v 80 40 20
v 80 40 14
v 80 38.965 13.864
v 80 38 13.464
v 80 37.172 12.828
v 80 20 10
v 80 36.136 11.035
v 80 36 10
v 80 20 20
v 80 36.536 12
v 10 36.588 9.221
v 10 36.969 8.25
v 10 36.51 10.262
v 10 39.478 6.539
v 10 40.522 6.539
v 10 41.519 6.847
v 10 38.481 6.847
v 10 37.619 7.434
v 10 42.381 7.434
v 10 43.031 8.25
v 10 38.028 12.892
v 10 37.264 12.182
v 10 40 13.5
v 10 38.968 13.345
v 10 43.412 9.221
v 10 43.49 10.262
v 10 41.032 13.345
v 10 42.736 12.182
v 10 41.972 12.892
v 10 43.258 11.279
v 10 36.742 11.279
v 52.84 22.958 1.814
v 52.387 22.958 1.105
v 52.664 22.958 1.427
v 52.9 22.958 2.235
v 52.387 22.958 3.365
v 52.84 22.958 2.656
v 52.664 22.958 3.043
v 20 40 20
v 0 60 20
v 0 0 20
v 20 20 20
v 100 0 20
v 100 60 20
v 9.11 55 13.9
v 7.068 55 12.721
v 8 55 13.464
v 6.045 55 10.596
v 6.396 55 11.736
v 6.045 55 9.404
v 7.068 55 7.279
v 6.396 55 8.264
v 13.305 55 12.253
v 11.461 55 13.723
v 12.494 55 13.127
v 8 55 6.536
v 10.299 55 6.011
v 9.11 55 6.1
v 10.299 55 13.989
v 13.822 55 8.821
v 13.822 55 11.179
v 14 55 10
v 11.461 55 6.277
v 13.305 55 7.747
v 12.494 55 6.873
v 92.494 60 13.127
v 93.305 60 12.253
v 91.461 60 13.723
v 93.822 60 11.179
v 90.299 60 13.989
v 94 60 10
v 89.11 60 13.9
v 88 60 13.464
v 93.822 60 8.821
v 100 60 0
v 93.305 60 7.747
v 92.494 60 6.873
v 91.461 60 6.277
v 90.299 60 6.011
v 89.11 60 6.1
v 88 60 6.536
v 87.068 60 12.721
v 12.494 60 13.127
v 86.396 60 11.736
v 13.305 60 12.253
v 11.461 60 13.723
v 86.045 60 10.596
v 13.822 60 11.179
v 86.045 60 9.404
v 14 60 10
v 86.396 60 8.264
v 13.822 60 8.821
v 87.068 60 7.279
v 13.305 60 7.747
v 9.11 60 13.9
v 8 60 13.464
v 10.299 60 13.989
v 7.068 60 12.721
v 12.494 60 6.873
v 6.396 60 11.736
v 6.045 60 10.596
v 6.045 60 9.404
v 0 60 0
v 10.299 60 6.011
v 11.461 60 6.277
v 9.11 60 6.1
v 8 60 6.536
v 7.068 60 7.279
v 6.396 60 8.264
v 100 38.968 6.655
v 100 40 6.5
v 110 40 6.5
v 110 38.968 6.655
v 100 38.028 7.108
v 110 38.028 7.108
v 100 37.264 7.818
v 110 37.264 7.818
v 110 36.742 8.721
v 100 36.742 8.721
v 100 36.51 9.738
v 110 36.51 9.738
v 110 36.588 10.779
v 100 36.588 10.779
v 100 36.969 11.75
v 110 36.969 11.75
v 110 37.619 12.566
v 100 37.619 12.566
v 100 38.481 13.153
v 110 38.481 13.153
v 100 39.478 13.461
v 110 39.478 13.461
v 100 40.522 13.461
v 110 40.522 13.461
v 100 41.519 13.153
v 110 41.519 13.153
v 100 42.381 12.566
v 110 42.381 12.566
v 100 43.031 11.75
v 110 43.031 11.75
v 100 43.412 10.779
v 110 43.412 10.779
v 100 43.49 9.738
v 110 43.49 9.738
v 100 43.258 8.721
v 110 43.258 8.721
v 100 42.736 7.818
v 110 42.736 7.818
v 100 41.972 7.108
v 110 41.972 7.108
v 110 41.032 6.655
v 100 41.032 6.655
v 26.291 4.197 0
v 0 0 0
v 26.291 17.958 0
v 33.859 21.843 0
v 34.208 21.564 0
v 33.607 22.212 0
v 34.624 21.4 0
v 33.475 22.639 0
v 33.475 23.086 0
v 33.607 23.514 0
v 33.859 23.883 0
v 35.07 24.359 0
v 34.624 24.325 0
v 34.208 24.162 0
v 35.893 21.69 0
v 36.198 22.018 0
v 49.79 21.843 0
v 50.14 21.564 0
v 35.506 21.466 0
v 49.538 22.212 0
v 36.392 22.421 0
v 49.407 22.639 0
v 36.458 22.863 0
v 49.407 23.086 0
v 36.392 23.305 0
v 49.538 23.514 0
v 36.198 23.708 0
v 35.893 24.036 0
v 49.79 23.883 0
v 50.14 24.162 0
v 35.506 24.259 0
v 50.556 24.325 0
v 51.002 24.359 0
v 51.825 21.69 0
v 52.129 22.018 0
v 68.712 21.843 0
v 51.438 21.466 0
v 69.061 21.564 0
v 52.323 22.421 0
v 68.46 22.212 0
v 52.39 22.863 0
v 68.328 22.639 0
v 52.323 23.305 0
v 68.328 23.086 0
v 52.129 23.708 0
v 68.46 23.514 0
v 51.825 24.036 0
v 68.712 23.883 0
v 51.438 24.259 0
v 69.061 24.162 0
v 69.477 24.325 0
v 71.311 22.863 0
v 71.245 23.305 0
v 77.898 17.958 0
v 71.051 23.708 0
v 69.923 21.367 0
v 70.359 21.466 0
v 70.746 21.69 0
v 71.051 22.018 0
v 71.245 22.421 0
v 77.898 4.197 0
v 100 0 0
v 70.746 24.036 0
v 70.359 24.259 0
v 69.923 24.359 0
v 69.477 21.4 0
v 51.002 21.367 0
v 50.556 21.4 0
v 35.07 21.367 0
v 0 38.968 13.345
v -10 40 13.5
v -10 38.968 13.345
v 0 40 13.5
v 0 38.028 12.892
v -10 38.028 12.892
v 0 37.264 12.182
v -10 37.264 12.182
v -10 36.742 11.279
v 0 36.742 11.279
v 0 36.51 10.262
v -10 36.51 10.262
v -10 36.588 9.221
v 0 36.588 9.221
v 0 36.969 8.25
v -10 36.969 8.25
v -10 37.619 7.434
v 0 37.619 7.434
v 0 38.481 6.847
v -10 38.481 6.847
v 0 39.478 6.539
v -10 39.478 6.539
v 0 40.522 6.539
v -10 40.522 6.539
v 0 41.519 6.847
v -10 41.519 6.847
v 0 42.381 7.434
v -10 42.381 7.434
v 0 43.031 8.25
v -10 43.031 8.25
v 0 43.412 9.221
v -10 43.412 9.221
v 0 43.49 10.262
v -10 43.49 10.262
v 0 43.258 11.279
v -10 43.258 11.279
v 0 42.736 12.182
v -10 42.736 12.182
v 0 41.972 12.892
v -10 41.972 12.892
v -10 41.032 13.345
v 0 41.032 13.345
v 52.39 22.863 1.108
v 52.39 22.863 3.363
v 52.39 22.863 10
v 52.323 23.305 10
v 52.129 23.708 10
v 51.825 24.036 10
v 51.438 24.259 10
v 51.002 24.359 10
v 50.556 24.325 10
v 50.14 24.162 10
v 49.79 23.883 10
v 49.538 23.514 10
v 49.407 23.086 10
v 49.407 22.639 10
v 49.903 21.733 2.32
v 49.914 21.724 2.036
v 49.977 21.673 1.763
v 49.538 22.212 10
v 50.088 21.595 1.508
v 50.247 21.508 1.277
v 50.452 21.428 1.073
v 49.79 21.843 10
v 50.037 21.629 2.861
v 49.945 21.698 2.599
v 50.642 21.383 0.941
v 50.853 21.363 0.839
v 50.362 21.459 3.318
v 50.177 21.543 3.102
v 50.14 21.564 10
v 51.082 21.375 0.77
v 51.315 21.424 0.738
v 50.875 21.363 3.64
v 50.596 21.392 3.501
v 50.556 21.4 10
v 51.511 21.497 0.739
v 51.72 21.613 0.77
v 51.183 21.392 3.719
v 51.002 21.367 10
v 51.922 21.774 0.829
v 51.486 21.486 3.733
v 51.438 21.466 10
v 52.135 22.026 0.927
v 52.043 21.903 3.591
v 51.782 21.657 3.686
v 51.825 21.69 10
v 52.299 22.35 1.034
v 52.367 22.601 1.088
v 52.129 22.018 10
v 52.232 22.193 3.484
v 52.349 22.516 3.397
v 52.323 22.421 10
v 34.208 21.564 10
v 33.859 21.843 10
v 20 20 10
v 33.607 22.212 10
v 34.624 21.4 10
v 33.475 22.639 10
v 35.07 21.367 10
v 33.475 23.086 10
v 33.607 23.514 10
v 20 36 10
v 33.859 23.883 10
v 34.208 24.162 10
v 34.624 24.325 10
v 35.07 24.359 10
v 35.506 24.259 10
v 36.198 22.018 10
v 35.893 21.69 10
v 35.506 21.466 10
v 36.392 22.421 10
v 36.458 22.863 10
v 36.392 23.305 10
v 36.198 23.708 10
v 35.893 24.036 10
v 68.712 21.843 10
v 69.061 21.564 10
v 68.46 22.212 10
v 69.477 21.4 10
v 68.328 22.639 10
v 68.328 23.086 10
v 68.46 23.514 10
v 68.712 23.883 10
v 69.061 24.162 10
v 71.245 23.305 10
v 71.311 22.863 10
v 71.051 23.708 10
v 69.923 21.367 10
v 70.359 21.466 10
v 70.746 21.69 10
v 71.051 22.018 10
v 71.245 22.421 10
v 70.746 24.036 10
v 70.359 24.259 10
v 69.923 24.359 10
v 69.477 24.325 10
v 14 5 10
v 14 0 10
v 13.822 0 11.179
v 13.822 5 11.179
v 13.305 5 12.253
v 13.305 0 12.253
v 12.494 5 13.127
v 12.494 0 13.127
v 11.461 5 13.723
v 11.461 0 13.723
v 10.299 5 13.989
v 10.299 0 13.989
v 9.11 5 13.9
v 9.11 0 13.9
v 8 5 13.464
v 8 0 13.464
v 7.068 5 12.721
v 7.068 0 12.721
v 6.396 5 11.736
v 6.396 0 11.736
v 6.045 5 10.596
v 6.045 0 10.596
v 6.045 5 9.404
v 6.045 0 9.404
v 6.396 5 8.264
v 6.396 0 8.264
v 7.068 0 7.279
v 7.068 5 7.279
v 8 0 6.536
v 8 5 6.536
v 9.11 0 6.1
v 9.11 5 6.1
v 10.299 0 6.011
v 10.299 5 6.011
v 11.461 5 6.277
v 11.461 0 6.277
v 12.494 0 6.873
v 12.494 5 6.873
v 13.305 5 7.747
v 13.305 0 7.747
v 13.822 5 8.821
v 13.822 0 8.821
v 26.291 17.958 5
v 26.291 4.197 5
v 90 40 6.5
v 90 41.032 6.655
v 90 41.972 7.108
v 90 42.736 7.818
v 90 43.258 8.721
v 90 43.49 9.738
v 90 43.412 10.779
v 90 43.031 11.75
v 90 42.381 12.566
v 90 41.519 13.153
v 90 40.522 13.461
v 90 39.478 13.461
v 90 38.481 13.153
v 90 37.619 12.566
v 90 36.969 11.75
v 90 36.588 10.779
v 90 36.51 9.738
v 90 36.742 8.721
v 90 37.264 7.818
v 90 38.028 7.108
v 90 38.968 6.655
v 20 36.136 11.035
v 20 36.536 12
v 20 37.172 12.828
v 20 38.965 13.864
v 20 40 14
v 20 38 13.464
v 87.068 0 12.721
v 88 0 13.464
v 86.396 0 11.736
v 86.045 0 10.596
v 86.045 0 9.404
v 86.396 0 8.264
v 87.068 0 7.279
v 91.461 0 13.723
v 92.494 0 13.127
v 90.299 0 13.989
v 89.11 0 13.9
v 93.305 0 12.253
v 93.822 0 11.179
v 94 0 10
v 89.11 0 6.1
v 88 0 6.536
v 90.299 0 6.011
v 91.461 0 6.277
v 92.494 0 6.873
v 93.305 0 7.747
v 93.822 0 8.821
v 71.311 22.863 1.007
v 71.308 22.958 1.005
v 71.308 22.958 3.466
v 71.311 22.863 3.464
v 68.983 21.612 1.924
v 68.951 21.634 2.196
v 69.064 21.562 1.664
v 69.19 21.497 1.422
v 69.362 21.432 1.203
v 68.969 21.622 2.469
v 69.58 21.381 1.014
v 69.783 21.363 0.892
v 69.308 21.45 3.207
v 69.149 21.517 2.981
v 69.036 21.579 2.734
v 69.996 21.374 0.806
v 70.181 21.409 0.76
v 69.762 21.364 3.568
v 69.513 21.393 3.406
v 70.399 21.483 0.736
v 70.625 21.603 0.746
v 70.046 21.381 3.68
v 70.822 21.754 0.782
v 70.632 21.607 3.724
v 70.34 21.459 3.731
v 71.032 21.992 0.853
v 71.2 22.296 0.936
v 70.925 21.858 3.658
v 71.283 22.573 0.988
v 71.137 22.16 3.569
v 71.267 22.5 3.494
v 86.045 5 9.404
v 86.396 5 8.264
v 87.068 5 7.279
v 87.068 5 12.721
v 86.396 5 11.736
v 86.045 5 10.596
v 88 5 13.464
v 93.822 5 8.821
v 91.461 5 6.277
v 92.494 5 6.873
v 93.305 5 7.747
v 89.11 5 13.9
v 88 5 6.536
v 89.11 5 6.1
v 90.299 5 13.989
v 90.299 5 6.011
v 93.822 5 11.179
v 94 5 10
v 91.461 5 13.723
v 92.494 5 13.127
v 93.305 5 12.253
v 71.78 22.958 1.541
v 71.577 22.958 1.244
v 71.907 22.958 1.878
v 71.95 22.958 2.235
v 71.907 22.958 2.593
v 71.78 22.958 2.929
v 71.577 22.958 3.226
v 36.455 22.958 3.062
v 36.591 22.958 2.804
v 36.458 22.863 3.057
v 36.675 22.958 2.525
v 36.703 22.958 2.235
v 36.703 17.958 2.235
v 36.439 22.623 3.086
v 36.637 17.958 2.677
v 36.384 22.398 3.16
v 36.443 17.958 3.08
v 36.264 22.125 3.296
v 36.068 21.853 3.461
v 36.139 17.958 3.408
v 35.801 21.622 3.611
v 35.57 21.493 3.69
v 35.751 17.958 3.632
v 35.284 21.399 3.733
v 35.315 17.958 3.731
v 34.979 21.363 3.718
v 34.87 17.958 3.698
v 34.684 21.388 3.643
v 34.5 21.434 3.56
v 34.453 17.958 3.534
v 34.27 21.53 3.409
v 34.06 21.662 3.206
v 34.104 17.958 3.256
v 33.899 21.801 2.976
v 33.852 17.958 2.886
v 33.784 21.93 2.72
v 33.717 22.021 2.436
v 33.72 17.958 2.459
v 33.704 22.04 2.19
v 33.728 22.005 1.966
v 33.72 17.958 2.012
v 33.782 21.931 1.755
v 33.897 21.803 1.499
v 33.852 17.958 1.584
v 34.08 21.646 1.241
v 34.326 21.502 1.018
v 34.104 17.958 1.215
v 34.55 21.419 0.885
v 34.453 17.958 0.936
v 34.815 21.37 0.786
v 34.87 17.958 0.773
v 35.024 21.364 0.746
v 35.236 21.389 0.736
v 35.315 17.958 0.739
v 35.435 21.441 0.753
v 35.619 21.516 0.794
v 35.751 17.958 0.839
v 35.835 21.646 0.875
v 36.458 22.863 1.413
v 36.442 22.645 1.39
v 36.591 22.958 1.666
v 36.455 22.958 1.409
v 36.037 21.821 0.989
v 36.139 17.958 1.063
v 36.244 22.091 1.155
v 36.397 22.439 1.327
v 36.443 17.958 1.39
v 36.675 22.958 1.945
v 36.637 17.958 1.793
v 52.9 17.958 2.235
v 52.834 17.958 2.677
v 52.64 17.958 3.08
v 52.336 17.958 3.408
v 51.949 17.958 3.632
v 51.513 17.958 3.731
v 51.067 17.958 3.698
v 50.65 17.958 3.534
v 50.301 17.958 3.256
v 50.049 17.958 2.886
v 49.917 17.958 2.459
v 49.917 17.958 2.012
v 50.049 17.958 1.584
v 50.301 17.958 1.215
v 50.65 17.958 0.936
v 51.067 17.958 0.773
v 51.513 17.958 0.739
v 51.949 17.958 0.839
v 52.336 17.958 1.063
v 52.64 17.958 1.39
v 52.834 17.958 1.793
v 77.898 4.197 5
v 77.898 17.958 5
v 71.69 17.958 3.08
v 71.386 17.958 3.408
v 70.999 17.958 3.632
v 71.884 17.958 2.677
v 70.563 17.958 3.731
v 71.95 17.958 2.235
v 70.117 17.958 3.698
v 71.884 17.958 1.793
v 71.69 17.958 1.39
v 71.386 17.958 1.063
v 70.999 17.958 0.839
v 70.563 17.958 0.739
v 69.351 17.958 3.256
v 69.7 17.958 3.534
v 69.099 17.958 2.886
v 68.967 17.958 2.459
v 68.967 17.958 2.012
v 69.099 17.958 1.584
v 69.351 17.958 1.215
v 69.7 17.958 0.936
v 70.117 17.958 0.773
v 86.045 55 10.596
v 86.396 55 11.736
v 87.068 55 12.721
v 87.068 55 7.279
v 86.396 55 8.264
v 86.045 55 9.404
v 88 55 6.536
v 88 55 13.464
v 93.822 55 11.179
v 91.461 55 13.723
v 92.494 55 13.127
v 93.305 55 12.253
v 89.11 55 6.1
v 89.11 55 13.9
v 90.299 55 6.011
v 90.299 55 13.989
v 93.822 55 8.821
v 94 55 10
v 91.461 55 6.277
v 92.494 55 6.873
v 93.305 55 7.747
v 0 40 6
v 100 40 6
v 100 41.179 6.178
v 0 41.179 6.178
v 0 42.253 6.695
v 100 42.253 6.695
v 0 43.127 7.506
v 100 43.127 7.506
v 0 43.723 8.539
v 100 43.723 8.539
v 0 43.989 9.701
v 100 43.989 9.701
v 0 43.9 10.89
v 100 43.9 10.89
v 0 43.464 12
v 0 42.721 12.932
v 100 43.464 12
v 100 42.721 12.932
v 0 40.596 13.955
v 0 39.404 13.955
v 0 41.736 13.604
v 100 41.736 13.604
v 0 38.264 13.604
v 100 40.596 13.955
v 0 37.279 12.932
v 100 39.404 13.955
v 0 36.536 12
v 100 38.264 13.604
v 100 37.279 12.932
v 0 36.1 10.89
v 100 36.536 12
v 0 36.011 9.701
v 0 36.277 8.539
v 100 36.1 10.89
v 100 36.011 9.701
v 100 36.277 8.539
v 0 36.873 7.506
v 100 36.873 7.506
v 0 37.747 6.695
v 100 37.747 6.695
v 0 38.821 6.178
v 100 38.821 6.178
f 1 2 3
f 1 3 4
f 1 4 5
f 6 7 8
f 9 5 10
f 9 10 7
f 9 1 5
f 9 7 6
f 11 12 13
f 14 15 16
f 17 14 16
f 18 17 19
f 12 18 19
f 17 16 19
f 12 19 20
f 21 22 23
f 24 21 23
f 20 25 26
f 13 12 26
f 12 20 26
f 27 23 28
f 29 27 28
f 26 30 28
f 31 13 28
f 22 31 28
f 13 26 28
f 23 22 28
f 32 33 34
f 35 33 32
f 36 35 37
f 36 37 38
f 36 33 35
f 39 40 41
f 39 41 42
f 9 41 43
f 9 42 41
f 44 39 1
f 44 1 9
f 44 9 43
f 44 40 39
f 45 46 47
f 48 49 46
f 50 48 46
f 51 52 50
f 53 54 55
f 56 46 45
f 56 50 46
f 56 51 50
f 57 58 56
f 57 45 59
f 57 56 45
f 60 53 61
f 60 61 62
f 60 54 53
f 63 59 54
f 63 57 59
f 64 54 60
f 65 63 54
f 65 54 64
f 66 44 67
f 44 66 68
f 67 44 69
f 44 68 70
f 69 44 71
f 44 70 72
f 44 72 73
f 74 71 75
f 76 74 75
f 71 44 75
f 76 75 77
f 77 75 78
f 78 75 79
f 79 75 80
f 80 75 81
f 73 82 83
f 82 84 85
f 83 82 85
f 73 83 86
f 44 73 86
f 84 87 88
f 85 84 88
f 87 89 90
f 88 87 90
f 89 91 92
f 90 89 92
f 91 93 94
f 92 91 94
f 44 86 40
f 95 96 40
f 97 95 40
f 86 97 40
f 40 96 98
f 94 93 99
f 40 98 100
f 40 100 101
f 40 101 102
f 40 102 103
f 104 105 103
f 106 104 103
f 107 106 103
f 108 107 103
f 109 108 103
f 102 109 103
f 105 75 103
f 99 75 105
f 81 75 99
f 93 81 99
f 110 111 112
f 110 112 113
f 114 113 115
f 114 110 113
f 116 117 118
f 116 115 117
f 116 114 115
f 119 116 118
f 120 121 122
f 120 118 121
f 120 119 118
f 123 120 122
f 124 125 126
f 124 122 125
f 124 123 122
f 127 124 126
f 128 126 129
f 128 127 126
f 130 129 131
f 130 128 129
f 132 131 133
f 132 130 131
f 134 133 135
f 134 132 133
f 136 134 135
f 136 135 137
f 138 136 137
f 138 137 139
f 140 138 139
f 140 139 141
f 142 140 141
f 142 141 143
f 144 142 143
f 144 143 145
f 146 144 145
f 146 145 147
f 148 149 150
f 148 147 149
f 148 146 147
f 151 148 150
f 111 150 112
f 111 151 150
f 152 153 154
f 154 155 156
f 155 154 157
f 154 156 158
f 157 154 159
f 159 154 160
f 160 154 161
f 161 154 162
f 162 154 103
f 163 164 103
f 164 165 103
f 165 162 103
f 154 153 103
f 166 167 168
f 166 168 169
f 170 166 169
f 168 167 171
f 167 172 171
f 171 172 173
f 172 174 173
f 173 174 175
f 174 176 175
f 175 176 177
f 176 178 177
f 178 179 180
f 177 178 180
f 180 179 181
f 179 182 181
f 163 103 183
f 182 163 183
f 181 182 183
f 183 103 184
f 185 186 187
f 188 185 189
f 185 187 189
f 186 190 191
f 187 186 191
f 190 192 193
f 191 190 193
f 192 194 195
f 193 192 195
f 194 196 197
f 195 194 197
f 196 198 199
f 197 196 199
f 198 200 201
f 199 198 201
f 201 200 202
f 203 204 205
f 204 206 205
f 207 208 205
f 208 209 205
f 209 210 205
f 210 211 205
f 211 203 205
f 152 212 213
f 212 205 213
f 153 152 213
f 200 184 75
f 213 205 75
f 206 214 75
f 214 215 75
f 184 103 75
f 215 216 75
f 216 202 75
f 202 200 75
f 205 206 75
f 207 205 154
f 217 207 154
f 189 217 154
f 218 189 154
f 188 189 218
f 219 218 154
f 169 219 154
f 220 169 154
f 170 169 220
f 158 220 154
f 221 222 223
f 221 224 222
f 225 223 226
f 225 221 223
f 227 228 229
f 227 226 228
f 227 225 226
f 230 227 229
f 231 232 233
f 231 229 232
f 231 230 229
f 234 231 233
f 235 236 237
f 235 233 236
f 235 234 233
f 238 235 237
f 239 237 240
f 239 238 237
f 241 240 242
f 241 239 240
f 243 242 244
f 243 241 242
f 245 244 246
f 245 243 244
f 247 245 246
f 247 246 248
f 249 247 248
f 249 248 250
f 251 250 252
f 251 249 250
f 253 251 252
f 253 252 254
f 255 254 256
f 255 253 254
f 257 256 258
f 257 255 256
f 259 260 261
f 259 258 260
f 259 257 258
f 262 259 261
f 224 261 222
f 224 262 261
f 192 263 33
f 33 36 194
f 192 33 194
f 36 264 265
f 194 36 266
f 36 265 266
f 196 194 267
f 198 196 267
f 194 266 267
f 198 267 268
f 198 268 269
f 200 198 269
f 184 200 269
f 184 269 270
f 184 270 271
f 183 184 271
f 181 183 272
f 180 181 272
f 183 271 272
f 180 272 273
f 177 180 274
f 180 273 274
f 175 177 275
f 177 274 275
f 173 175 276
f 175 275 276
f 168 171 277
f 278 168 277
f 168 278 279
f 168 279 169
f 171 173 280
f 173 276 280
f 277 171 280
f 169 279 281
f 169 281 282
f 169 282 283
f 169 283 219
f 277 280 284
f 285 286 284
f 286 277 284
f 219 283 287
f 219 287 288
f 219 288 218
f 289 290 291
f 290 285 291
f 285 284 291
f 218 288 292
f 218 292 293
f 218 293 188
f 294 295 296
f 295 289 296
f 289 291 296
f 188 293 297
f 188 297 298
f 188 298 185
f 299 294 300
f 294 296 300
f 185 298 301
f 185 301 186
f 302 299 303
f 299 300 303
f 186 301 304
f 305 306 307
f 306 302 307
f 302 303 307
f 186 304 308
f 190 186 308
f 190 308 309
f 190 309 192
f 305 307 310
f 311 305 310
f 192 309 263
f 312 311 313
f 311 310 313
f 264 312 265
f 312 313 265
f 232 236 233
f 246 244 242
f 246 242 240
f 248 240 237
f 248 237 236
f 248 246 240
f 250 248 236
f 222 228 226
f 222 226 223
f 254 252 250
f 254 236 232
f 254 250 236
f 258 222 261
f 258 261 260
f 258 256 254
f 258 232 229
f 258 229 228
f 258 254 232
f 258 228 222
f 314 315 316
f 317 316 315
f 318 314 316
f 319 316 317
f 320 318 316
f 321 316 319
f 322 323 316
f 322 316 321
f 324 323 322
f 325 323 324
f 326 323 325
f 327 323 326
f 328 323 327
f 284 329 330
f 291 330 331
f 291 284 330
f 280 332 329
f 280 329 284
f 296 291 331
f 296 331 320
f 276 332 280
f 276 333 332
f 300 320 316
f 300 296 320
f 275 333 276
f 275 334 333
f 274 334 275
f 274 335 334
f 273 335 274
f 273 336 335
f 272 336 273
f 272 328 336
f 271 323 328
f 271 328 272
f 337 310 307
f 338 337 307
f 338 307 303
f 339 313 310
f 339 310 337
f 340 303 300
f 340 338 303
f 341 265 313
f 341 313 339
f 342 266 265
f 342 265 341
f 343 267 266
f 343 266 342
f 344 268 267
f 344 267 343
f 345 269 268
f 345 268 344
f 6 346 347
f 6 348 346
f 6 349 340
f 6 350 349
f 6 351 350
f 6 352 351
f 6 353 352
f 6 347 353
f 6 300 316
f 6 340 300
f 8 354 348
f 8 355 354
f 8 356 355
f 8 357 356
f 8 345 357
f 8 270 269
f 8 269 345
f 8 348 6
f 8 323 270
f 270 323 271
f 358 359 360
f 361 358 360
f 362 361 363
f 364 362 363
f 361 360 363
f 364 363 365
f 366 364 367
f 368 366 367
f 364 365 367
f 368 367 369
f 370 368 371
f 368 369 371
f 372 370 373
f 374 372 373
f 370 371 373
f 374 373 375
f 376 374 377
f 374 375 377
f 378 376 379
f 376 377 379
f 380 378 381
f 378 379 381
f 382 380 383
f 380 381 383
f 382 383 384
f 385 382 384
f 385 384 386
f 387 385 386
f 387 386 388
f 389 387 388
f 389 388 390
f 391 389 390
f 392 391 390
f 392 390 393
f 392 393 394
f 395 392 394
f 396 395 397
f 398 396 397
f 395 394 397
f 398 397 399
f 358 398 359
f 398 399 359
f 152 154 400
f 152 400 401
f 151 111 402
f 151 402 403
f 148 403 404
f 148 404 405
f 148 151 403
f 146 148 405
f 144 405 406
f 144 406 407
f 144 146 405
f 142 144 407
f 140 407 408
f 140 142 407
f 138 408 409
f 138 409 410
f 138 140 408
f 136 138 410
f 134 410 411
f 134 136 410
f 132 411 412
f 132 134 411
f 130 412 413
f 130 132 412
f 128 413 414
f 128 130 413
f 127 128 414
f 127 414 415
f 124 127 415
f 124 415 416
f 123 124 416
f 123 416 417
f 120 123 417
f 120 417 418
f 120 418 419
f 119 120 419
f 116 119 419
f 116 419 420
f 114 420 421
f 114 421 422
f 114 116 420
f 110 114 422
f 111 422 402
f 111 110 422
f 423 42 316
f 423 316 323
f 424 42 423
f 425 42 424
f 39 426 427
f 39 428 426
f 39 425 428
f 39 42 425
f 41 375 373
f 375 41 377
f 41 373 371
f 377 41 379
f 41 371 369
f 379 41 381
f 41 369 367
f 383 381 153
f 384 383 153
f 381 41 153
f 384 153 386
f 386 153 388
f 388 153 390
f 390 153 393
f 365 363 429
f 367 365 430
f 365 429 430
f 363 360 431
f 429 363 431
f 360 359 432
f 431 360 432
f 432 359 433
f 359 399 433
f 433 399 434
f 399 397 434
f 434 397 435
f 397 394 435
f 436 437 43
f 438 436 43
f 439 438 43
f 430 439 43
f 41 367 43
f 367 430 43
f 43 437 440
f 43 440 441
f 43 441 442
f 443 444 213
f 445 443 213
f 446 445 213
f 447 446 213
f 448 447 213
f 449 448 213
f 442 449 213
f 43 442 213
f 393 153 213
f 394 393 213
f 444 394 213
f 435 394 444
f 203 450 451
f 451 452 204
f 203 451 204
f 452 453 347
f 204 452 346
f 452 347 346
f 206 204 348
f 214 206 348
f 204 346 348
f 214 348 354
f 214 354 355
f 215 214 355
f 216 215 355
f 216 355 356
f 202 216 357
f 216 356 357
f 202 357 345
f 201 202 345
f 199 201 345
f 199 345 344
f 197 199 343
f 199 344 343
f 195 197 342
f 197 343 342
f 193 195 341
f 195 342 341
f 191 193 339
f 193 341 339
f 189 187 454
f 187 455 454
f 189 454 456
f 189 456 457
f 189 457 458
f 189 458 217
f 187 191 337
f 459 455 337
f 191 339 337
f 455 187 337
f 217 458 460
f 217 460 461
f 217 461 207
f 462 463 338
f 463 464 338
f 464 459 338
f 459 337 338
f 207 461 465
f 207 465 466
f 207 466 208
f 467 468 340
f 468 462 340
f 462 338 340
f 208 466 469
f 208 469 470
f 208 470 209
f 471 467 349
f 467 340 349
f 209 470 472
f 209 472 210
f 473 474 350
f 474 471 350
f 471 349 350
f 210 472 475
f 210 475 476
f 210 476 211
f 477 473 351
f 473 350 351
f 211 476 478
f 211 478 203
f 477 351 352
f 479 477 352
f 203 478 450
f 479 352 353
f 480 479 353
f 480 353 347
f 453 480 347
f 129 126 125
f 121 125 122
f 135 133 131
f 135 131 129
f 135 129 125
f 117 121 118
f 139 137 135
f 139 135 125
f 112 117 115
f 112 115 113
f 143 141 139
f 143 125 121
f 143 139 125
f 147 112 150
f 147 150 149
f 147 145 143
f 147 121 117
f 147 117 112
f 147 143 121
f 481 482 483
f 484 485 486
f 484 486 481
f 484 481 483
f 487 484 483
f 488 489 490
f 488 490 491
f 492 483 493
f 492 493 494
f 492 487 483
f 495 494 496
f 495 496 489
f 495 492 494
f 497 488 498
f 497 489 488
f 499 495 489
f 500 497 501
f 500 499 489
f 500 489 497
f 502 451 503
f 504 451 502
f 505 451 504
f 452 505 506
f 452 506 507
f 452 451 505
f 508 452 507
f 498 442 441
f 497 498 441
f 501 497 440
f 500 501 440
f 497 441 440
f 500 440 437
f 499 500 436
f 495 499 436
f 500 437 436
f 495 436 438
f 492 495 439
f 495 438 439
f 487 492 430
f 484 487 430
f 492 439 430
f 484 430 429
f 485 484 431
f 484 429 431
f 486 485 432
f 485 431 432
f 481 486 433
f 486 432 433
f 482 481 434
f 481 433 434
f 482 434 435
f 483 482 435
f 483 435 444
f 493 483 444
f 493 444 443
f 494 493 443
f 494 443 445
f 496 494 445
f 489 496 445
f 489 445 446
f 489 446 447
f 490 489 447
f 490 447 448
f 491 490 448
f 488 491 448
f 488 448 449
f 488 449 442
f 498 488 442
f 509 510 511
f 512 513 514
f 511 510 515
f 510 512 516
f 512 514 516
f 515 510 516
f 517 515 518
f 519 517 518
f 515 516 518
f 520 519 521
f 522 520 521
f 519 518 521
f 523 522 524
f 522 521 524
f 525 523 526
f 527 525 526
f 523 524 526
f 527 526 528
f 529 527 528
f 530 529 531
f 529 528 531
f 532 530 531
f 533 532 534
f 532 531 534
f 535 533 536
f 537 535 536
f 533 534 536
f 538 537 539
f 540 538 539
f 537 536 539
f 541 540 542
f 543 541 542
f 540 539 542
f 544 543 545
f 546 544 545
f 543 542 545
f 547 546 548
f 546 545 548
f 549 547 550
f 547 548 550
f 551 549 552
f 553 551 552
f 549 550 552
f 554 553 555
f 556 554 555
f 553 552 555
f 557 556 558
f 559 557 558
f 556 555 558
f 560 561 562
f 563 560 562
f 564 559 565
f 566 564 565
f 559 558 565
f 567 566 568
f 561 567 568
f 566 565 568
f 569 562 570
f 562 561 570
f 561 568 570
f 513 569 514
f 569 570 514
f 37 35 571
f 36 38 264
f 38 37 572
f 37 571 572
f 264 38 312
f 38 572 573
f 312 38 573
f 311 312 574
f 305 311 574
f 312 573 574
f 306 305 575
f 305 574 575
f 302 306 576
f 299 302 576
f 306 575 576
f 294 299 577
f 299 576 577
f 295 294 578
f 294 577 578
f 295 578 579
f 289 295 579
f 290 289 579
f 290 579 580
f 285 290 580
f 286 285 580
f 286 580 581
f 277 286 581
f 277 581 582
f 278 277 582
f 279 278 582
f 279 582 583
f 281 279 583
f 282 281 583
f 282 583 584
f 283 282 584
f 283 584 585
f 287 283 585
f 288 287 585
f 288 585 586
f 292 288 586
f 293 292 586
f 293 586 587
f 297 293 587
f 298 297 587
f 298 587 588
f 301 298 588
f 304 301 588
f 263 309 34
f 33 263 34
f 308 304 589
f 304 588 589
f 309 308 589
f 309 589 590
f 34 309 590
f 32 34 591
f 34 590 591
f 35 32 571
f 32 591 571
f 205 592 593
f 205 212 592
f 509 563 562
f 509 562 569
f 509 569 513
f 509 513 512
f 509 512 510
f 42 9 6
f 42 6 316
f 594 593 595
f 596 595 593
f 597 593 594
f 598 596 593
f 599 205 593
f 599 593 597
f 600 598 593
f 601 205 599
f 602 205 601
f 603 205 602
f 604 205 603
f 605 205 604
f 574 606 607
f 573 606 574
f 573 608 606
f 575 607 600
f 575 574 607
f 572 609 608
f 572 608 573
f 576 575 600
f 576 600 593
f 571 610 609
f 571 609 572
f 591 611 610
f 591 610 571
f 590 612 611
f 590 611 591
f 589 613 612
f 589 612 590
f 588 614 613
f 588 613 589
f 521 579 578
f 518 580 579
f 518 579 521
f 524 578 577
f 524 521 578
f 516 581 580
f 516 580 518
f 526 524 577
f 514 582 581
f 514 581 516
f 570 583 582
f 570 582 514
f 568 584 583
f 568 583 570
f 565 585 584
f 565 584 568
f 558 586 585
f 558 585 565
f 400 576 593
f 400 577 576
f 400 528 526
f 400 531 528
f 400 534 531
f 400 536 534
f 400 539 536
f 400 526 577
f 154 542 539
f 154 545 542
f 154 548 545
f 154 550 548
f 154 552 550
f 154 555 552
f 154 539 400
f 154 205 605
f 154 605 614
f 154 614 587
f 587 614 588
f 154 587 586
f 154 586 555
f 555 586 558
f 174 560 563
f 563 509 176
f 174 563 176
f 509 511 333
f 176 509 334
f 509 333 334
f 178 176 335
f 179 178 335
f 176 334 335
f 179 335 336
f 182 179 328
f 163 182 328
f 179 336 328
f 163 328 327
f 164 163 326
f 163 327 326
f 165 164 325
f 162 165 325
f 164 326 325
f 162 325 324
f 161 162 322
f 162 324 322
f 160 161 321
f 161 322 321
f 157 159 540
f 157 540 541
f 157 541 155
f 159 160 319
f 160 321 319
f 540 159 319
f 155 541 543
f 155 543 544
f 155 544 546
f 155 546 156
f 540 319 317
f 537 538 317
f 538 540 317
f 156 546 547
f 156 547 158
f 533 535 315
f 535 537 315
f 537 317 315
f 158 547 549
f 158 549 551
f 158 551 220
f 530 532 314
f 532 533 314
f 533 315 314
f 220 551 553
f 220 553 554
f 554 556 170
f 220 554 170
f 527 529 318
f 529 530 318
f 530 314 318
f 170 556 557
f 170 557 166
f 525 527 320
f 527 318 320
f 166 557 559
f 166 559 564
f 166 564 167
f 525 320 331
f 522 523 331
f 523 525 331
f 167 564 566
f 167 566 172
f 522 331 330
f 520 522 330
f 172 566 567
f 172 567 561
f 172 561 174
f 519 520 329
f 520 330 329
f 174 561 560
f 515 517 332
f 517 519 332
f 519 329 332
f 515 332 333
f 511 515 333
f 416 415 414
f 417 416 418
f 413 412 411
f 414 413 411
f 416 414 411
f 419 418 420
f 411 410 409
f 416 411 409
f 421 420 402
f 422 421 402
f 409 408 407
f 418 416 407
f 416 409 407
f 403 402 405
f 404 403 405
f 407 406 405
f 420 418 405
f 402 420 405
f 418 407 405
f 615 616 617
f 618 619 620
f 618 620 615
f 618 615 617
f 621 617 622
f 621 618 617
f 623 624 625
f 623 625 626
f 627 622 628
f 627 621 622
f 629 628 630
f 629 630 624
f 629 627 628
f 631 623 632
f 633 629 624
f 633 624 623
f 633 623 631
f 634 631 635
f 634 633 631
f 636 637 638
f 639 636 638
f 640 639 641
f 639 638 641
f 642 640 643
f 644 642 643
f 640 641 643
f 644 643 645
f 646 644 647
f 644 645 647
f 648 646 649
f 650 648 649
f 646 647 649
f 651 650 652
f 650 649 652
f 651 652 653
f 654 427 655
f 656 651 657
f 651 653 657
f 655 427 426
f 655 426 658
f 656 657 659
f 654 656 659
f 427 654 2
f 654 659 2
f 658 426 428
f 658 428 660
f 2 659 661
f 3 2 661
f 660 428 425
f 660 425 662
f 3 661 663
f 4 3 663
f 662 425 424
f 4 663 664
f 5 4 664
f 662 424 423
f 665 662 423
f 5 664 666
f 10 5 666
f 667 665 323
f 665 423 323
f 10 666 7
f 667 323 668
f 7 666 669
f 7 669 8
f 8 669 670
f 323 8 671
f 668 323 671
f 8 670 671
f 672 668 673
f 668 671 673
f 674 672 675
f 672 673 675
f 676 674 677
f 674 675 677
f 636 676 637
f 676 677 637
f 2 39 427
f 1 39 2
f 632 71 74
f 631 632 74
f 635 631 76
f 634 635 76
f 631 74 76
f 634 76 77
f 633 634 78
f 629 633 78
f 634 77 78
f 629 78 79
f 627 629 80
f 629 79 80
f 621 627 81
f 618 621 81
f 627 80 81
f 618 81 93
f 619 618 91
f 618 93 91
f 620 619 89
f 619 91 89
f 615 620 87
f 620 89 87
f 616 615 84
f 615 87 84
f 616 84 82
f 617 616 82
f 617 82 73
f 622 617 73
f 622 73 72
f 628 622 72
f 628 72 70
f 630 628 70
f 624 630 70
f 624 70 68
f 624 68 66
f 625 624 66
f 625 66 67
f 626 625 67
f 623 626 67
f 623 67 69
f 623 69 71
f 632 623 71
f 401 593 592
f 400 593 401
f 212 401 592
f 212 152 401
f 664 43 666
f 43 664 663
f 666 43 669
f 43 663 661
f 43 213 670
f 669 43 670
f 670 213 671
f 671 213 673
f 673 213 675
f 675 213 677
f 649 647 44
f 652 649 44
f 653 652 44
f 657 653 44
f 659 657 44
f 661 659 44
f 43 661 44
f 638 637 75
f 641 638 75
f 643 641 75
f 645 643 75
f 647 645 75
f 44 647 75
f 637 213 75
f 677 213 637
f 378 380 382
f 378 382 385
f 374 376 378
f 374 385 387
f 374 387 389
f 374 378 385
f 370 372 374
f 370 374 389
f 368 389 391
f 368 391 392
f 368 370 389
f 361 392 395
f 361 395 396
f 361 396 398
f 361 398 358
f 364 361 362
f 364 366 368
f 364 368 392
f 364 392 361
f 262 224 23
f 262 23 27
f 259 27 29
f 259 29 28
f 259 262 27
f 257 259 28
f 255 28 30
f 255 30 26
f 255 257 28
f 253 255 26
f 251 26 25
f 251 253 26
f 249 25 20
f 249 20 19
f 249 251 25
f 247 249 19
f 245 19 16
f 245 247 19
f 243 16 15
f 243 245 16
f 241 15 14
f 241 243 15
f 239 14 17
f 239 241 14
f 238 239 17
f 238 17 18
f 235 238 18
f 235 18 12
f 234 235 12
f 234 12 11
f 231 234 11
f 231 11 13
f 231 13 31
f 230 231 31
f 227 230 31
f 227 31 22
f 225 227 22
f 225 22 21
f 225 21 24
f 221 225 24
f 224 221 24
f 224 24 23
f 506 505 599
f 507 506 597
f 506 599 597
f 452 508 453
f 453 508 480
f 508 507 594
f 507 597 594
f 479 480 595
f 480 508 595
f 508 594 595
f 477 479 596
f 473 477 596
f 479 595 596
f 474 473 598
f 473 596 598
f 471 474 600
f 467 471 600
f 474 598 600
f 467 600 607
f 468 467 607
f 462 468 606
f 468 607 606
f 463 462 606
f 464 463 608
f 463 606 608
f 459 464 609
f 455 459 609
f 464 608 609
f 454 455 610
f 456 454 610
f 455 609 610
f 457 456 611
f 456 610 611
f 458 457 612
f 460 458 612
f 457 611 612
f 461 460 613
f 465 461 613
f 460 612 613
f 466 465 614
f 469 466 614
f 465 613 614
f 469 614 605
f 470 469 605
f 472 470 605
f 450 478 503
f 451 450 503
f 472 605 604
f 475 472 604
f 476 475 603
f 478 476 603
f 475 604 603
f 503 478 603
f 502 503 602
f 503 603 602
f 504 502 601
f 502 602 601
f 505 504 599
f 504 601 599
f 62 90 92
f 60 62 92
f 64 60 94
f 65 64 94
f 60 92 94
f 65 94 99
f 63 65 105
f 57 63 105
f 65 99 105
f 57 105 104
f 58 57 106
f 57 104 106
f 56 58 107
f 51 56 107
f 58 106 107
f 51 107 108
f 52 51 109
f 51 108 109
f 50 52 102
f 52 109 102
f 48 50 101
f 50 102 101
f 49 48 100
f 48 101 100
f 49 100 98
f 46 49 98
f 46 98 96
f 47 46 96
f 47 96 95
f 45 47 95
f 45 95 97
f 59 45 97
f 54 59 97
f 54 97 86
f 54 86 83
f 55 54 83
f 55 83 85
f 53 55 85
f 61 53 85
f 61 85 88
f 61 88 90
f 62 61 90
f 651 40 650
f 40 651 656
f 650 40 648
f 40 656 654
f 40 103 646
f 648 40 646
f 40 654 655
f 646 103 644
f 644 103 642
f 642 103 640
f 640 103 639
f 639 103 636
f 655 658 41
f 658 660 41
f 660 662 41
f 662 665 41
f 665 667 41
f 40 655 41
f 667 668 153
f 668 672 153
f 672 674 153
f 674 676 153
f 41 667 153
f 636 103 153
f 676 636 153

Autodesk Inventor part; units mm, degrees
ref_plane "YZ Plane" through (0, 0, 0) normal (1, 0, 0) x (0, 1, 0)
ref_plane "XZ Plane" through (0, 0, 0) normal (0, 1, 0) x (-1, 0, 0)
ref_plane "XY Plane" through (0, 0, 0) normal (0, 0, 1) x (1, 0, 0)
sketch "Sketch1" plane through (0, 0, 0) normal (0, 0, 1) x (1, 0, 0)
  line L0 (0, 60) -> (0, 0)
  line L1 (0, 0) -> (100, 0)
  line L2 (100, 0) -> (100, 60)
  line L3 (100, 60) -> (0, 60)
  dimension "d0" = 100
  dimension "d1" = 60
extrude "Extrusion1" add sketch "Sketch1" along normal blind 20
sketch "Sketch2" plane through (0, 0, 20) normal (0, 0, 1) x (1, 0, 0)
  line L0 (20, 40) -> (80, 40)
  line L1 (80, 40) -> (80, 20)
  line L2 (80, 20) -> (20, 20)
  line L3 (20, 20) -> (20, 40)
  line L4 (0, 60) -> (0, 0) projected
  line L5 (100, 0) -> (100, 60) projected
  line L6 (100, 60) -> (0, 60) projected
  line L7 (0, 0) -> (100, 0) projected
  dimension "d4" = 20
  dimension "d5" = 20
  dimension "d6" = 20
  dimension "d7" = 20
  dimension "d8" = 60
  dimension "d9" = 20
extrude "Extrusion2" cut sketch "Sketch2" against normal blind 10 contours L0 L1 L2 L3
sketch "Sketch3" plane through (100, 0, 0) normal (1, 0, 0) x (0, 0, -1)
  circle A0 centre (-10, 40) radius 4
  point P0 (0, 0)
  dimension "d12" = 8
extrude "Extrusion3" cut sketch "Sketch3" against normal through all
sketch "Sketch4" plane through (0, 60, 0) normal (0, 1, 0) x (1, 0, 0)
  line L0 (100, 0) -> (0, 0) projected
  line L1 (100, -20) -> (0, -20) projected
  line L2 (100, 0) -> (100, -20) projected
  line L3 (0, 0) -> (100, 0) projected
  line L4 (0, 0) -> (0, -20) projected
  line L5 (100, -6) -> (100, -14) projected
  circle A0 centre (10, -10) radius 4
  circle A1 centre (90, -10) radius 4
  dimension "d21" = 20
  dimension "d27" = 8
  dimension "d28" = 8
  dimension "d29" = 80
sketch "Sketch5" plane through (0, 60, 0) normal (0, 1, 0) x (1, 0, 0)
  point P0 (0, 0)
extrude "Extrusion4" cut sketch "Sketch4" against normal blind 5 contours A0 | A1
sketch "Sketch6" plane through (0, 0, 0) normal (0, -1, 0) x (1, 0, 0)
  circle A0 centre (10, 10) radius 4 projected
  circle A1 centre (10, 10) radius 4
  circle A2 centre (90, 10) radius 4 projected
  circle A3 centre (90, 10) radius 4
  line L0 (0, 0) -> (0, 20) projected
  line L1 (100, 0) -> (100, 20) projected
  dimension "d32" = 8
  dimension "d33" = 8
  dimension "d34" = 80
  dimension "d35" = 10
  dimension "d36" = 10
extrude "Extrusion5" cut sketch "Sketch6" against normal blind 5
sketch "Sketch7" plane through (0, 0, 20) normal (0, 0, 1) x (1, 0, 0)
  circle A0 centre (34.9582, 22.8628) radius 1.5
  circle A1 centre (50.8899, 22.8628) radius 1.5
  circle A2 centre (69.8112, 22.8628) radius 1.5
  point P0 (0, 0)
  dimension "d39" = 3
  dimension "d40" = 3
  dimension "d41" = 3
extrude "Extrusion6" cut sketch "Sketch7" against normal through all
sketch "Sketch8" plane through (0, 0, 0) normal (0, 0, -1) x (-1, 0, 0)
  line L0 (-77.8976, 17.9584) -> (-26.2908, 17.9584)
  line L1 (-26.2908, 17.9584) -> (-26.2908, 4.1966)
  line L2 (-26.2908, 4.1966) -> (-77.8976, 4.1966)
  line L3 (-77.8976, 4.1966) -> (-77.8976, 17.9584)
  point P0 (0, 0)
extrude "Extrusion7" cut sketch "Sketch8" against normal blind 5
sketch "Sketch9" plane through (26.2908, 17.9584, 0) normal (0, -1, 0) x (1, 0, 0)
  circle A0 centre (44.1597, 2.2353) radius 1.5
  circle A1 centre (25.1097, 2.2353) radius 1.5
  circle A2 centre (8.9126, 2.2353) radius 1.5
  point P0 (-26.2908, 0)
  dimension "d46" = 3
  dimension "d47" = 3
  dimension "d48" = 3
extrude "Extrusion8" cut sketch "Sketch9" against normal blind 5
sketch "Sketch10" plane through (0, 0, 0) normal (0, -1, 0) x (1, 0, 0)
  point P0 (0, 0)
sketch "Sketch11" plane through (100, 0, 0) normal (1, 0, 0) x (0, 0, -1)
  circle A0 centre (-10, 40) radius 4 projected
  circle A1 centre (-10, 40) radius 3.5
  point P0 (0, 0)
  dimension "d51" = 7
extrude "Extrusion9" add sketch "Sketch11" along normal mid plane 20 contours A1
sketch "Sketch12" plane through (0, 0, 0) normal (-1, 0, 0) x (0, 0, 1)
  circle A0 centre (10, 40) radius 3.5 projected
  circle A1 centre (10, 40) radius 3.5
  point P0 (0, 0)
extrude "Extrusion10" add sketch "Sketch12" along normal mid plane 20
properties part number "middle part edited" material "Polyethylene, High Density"
